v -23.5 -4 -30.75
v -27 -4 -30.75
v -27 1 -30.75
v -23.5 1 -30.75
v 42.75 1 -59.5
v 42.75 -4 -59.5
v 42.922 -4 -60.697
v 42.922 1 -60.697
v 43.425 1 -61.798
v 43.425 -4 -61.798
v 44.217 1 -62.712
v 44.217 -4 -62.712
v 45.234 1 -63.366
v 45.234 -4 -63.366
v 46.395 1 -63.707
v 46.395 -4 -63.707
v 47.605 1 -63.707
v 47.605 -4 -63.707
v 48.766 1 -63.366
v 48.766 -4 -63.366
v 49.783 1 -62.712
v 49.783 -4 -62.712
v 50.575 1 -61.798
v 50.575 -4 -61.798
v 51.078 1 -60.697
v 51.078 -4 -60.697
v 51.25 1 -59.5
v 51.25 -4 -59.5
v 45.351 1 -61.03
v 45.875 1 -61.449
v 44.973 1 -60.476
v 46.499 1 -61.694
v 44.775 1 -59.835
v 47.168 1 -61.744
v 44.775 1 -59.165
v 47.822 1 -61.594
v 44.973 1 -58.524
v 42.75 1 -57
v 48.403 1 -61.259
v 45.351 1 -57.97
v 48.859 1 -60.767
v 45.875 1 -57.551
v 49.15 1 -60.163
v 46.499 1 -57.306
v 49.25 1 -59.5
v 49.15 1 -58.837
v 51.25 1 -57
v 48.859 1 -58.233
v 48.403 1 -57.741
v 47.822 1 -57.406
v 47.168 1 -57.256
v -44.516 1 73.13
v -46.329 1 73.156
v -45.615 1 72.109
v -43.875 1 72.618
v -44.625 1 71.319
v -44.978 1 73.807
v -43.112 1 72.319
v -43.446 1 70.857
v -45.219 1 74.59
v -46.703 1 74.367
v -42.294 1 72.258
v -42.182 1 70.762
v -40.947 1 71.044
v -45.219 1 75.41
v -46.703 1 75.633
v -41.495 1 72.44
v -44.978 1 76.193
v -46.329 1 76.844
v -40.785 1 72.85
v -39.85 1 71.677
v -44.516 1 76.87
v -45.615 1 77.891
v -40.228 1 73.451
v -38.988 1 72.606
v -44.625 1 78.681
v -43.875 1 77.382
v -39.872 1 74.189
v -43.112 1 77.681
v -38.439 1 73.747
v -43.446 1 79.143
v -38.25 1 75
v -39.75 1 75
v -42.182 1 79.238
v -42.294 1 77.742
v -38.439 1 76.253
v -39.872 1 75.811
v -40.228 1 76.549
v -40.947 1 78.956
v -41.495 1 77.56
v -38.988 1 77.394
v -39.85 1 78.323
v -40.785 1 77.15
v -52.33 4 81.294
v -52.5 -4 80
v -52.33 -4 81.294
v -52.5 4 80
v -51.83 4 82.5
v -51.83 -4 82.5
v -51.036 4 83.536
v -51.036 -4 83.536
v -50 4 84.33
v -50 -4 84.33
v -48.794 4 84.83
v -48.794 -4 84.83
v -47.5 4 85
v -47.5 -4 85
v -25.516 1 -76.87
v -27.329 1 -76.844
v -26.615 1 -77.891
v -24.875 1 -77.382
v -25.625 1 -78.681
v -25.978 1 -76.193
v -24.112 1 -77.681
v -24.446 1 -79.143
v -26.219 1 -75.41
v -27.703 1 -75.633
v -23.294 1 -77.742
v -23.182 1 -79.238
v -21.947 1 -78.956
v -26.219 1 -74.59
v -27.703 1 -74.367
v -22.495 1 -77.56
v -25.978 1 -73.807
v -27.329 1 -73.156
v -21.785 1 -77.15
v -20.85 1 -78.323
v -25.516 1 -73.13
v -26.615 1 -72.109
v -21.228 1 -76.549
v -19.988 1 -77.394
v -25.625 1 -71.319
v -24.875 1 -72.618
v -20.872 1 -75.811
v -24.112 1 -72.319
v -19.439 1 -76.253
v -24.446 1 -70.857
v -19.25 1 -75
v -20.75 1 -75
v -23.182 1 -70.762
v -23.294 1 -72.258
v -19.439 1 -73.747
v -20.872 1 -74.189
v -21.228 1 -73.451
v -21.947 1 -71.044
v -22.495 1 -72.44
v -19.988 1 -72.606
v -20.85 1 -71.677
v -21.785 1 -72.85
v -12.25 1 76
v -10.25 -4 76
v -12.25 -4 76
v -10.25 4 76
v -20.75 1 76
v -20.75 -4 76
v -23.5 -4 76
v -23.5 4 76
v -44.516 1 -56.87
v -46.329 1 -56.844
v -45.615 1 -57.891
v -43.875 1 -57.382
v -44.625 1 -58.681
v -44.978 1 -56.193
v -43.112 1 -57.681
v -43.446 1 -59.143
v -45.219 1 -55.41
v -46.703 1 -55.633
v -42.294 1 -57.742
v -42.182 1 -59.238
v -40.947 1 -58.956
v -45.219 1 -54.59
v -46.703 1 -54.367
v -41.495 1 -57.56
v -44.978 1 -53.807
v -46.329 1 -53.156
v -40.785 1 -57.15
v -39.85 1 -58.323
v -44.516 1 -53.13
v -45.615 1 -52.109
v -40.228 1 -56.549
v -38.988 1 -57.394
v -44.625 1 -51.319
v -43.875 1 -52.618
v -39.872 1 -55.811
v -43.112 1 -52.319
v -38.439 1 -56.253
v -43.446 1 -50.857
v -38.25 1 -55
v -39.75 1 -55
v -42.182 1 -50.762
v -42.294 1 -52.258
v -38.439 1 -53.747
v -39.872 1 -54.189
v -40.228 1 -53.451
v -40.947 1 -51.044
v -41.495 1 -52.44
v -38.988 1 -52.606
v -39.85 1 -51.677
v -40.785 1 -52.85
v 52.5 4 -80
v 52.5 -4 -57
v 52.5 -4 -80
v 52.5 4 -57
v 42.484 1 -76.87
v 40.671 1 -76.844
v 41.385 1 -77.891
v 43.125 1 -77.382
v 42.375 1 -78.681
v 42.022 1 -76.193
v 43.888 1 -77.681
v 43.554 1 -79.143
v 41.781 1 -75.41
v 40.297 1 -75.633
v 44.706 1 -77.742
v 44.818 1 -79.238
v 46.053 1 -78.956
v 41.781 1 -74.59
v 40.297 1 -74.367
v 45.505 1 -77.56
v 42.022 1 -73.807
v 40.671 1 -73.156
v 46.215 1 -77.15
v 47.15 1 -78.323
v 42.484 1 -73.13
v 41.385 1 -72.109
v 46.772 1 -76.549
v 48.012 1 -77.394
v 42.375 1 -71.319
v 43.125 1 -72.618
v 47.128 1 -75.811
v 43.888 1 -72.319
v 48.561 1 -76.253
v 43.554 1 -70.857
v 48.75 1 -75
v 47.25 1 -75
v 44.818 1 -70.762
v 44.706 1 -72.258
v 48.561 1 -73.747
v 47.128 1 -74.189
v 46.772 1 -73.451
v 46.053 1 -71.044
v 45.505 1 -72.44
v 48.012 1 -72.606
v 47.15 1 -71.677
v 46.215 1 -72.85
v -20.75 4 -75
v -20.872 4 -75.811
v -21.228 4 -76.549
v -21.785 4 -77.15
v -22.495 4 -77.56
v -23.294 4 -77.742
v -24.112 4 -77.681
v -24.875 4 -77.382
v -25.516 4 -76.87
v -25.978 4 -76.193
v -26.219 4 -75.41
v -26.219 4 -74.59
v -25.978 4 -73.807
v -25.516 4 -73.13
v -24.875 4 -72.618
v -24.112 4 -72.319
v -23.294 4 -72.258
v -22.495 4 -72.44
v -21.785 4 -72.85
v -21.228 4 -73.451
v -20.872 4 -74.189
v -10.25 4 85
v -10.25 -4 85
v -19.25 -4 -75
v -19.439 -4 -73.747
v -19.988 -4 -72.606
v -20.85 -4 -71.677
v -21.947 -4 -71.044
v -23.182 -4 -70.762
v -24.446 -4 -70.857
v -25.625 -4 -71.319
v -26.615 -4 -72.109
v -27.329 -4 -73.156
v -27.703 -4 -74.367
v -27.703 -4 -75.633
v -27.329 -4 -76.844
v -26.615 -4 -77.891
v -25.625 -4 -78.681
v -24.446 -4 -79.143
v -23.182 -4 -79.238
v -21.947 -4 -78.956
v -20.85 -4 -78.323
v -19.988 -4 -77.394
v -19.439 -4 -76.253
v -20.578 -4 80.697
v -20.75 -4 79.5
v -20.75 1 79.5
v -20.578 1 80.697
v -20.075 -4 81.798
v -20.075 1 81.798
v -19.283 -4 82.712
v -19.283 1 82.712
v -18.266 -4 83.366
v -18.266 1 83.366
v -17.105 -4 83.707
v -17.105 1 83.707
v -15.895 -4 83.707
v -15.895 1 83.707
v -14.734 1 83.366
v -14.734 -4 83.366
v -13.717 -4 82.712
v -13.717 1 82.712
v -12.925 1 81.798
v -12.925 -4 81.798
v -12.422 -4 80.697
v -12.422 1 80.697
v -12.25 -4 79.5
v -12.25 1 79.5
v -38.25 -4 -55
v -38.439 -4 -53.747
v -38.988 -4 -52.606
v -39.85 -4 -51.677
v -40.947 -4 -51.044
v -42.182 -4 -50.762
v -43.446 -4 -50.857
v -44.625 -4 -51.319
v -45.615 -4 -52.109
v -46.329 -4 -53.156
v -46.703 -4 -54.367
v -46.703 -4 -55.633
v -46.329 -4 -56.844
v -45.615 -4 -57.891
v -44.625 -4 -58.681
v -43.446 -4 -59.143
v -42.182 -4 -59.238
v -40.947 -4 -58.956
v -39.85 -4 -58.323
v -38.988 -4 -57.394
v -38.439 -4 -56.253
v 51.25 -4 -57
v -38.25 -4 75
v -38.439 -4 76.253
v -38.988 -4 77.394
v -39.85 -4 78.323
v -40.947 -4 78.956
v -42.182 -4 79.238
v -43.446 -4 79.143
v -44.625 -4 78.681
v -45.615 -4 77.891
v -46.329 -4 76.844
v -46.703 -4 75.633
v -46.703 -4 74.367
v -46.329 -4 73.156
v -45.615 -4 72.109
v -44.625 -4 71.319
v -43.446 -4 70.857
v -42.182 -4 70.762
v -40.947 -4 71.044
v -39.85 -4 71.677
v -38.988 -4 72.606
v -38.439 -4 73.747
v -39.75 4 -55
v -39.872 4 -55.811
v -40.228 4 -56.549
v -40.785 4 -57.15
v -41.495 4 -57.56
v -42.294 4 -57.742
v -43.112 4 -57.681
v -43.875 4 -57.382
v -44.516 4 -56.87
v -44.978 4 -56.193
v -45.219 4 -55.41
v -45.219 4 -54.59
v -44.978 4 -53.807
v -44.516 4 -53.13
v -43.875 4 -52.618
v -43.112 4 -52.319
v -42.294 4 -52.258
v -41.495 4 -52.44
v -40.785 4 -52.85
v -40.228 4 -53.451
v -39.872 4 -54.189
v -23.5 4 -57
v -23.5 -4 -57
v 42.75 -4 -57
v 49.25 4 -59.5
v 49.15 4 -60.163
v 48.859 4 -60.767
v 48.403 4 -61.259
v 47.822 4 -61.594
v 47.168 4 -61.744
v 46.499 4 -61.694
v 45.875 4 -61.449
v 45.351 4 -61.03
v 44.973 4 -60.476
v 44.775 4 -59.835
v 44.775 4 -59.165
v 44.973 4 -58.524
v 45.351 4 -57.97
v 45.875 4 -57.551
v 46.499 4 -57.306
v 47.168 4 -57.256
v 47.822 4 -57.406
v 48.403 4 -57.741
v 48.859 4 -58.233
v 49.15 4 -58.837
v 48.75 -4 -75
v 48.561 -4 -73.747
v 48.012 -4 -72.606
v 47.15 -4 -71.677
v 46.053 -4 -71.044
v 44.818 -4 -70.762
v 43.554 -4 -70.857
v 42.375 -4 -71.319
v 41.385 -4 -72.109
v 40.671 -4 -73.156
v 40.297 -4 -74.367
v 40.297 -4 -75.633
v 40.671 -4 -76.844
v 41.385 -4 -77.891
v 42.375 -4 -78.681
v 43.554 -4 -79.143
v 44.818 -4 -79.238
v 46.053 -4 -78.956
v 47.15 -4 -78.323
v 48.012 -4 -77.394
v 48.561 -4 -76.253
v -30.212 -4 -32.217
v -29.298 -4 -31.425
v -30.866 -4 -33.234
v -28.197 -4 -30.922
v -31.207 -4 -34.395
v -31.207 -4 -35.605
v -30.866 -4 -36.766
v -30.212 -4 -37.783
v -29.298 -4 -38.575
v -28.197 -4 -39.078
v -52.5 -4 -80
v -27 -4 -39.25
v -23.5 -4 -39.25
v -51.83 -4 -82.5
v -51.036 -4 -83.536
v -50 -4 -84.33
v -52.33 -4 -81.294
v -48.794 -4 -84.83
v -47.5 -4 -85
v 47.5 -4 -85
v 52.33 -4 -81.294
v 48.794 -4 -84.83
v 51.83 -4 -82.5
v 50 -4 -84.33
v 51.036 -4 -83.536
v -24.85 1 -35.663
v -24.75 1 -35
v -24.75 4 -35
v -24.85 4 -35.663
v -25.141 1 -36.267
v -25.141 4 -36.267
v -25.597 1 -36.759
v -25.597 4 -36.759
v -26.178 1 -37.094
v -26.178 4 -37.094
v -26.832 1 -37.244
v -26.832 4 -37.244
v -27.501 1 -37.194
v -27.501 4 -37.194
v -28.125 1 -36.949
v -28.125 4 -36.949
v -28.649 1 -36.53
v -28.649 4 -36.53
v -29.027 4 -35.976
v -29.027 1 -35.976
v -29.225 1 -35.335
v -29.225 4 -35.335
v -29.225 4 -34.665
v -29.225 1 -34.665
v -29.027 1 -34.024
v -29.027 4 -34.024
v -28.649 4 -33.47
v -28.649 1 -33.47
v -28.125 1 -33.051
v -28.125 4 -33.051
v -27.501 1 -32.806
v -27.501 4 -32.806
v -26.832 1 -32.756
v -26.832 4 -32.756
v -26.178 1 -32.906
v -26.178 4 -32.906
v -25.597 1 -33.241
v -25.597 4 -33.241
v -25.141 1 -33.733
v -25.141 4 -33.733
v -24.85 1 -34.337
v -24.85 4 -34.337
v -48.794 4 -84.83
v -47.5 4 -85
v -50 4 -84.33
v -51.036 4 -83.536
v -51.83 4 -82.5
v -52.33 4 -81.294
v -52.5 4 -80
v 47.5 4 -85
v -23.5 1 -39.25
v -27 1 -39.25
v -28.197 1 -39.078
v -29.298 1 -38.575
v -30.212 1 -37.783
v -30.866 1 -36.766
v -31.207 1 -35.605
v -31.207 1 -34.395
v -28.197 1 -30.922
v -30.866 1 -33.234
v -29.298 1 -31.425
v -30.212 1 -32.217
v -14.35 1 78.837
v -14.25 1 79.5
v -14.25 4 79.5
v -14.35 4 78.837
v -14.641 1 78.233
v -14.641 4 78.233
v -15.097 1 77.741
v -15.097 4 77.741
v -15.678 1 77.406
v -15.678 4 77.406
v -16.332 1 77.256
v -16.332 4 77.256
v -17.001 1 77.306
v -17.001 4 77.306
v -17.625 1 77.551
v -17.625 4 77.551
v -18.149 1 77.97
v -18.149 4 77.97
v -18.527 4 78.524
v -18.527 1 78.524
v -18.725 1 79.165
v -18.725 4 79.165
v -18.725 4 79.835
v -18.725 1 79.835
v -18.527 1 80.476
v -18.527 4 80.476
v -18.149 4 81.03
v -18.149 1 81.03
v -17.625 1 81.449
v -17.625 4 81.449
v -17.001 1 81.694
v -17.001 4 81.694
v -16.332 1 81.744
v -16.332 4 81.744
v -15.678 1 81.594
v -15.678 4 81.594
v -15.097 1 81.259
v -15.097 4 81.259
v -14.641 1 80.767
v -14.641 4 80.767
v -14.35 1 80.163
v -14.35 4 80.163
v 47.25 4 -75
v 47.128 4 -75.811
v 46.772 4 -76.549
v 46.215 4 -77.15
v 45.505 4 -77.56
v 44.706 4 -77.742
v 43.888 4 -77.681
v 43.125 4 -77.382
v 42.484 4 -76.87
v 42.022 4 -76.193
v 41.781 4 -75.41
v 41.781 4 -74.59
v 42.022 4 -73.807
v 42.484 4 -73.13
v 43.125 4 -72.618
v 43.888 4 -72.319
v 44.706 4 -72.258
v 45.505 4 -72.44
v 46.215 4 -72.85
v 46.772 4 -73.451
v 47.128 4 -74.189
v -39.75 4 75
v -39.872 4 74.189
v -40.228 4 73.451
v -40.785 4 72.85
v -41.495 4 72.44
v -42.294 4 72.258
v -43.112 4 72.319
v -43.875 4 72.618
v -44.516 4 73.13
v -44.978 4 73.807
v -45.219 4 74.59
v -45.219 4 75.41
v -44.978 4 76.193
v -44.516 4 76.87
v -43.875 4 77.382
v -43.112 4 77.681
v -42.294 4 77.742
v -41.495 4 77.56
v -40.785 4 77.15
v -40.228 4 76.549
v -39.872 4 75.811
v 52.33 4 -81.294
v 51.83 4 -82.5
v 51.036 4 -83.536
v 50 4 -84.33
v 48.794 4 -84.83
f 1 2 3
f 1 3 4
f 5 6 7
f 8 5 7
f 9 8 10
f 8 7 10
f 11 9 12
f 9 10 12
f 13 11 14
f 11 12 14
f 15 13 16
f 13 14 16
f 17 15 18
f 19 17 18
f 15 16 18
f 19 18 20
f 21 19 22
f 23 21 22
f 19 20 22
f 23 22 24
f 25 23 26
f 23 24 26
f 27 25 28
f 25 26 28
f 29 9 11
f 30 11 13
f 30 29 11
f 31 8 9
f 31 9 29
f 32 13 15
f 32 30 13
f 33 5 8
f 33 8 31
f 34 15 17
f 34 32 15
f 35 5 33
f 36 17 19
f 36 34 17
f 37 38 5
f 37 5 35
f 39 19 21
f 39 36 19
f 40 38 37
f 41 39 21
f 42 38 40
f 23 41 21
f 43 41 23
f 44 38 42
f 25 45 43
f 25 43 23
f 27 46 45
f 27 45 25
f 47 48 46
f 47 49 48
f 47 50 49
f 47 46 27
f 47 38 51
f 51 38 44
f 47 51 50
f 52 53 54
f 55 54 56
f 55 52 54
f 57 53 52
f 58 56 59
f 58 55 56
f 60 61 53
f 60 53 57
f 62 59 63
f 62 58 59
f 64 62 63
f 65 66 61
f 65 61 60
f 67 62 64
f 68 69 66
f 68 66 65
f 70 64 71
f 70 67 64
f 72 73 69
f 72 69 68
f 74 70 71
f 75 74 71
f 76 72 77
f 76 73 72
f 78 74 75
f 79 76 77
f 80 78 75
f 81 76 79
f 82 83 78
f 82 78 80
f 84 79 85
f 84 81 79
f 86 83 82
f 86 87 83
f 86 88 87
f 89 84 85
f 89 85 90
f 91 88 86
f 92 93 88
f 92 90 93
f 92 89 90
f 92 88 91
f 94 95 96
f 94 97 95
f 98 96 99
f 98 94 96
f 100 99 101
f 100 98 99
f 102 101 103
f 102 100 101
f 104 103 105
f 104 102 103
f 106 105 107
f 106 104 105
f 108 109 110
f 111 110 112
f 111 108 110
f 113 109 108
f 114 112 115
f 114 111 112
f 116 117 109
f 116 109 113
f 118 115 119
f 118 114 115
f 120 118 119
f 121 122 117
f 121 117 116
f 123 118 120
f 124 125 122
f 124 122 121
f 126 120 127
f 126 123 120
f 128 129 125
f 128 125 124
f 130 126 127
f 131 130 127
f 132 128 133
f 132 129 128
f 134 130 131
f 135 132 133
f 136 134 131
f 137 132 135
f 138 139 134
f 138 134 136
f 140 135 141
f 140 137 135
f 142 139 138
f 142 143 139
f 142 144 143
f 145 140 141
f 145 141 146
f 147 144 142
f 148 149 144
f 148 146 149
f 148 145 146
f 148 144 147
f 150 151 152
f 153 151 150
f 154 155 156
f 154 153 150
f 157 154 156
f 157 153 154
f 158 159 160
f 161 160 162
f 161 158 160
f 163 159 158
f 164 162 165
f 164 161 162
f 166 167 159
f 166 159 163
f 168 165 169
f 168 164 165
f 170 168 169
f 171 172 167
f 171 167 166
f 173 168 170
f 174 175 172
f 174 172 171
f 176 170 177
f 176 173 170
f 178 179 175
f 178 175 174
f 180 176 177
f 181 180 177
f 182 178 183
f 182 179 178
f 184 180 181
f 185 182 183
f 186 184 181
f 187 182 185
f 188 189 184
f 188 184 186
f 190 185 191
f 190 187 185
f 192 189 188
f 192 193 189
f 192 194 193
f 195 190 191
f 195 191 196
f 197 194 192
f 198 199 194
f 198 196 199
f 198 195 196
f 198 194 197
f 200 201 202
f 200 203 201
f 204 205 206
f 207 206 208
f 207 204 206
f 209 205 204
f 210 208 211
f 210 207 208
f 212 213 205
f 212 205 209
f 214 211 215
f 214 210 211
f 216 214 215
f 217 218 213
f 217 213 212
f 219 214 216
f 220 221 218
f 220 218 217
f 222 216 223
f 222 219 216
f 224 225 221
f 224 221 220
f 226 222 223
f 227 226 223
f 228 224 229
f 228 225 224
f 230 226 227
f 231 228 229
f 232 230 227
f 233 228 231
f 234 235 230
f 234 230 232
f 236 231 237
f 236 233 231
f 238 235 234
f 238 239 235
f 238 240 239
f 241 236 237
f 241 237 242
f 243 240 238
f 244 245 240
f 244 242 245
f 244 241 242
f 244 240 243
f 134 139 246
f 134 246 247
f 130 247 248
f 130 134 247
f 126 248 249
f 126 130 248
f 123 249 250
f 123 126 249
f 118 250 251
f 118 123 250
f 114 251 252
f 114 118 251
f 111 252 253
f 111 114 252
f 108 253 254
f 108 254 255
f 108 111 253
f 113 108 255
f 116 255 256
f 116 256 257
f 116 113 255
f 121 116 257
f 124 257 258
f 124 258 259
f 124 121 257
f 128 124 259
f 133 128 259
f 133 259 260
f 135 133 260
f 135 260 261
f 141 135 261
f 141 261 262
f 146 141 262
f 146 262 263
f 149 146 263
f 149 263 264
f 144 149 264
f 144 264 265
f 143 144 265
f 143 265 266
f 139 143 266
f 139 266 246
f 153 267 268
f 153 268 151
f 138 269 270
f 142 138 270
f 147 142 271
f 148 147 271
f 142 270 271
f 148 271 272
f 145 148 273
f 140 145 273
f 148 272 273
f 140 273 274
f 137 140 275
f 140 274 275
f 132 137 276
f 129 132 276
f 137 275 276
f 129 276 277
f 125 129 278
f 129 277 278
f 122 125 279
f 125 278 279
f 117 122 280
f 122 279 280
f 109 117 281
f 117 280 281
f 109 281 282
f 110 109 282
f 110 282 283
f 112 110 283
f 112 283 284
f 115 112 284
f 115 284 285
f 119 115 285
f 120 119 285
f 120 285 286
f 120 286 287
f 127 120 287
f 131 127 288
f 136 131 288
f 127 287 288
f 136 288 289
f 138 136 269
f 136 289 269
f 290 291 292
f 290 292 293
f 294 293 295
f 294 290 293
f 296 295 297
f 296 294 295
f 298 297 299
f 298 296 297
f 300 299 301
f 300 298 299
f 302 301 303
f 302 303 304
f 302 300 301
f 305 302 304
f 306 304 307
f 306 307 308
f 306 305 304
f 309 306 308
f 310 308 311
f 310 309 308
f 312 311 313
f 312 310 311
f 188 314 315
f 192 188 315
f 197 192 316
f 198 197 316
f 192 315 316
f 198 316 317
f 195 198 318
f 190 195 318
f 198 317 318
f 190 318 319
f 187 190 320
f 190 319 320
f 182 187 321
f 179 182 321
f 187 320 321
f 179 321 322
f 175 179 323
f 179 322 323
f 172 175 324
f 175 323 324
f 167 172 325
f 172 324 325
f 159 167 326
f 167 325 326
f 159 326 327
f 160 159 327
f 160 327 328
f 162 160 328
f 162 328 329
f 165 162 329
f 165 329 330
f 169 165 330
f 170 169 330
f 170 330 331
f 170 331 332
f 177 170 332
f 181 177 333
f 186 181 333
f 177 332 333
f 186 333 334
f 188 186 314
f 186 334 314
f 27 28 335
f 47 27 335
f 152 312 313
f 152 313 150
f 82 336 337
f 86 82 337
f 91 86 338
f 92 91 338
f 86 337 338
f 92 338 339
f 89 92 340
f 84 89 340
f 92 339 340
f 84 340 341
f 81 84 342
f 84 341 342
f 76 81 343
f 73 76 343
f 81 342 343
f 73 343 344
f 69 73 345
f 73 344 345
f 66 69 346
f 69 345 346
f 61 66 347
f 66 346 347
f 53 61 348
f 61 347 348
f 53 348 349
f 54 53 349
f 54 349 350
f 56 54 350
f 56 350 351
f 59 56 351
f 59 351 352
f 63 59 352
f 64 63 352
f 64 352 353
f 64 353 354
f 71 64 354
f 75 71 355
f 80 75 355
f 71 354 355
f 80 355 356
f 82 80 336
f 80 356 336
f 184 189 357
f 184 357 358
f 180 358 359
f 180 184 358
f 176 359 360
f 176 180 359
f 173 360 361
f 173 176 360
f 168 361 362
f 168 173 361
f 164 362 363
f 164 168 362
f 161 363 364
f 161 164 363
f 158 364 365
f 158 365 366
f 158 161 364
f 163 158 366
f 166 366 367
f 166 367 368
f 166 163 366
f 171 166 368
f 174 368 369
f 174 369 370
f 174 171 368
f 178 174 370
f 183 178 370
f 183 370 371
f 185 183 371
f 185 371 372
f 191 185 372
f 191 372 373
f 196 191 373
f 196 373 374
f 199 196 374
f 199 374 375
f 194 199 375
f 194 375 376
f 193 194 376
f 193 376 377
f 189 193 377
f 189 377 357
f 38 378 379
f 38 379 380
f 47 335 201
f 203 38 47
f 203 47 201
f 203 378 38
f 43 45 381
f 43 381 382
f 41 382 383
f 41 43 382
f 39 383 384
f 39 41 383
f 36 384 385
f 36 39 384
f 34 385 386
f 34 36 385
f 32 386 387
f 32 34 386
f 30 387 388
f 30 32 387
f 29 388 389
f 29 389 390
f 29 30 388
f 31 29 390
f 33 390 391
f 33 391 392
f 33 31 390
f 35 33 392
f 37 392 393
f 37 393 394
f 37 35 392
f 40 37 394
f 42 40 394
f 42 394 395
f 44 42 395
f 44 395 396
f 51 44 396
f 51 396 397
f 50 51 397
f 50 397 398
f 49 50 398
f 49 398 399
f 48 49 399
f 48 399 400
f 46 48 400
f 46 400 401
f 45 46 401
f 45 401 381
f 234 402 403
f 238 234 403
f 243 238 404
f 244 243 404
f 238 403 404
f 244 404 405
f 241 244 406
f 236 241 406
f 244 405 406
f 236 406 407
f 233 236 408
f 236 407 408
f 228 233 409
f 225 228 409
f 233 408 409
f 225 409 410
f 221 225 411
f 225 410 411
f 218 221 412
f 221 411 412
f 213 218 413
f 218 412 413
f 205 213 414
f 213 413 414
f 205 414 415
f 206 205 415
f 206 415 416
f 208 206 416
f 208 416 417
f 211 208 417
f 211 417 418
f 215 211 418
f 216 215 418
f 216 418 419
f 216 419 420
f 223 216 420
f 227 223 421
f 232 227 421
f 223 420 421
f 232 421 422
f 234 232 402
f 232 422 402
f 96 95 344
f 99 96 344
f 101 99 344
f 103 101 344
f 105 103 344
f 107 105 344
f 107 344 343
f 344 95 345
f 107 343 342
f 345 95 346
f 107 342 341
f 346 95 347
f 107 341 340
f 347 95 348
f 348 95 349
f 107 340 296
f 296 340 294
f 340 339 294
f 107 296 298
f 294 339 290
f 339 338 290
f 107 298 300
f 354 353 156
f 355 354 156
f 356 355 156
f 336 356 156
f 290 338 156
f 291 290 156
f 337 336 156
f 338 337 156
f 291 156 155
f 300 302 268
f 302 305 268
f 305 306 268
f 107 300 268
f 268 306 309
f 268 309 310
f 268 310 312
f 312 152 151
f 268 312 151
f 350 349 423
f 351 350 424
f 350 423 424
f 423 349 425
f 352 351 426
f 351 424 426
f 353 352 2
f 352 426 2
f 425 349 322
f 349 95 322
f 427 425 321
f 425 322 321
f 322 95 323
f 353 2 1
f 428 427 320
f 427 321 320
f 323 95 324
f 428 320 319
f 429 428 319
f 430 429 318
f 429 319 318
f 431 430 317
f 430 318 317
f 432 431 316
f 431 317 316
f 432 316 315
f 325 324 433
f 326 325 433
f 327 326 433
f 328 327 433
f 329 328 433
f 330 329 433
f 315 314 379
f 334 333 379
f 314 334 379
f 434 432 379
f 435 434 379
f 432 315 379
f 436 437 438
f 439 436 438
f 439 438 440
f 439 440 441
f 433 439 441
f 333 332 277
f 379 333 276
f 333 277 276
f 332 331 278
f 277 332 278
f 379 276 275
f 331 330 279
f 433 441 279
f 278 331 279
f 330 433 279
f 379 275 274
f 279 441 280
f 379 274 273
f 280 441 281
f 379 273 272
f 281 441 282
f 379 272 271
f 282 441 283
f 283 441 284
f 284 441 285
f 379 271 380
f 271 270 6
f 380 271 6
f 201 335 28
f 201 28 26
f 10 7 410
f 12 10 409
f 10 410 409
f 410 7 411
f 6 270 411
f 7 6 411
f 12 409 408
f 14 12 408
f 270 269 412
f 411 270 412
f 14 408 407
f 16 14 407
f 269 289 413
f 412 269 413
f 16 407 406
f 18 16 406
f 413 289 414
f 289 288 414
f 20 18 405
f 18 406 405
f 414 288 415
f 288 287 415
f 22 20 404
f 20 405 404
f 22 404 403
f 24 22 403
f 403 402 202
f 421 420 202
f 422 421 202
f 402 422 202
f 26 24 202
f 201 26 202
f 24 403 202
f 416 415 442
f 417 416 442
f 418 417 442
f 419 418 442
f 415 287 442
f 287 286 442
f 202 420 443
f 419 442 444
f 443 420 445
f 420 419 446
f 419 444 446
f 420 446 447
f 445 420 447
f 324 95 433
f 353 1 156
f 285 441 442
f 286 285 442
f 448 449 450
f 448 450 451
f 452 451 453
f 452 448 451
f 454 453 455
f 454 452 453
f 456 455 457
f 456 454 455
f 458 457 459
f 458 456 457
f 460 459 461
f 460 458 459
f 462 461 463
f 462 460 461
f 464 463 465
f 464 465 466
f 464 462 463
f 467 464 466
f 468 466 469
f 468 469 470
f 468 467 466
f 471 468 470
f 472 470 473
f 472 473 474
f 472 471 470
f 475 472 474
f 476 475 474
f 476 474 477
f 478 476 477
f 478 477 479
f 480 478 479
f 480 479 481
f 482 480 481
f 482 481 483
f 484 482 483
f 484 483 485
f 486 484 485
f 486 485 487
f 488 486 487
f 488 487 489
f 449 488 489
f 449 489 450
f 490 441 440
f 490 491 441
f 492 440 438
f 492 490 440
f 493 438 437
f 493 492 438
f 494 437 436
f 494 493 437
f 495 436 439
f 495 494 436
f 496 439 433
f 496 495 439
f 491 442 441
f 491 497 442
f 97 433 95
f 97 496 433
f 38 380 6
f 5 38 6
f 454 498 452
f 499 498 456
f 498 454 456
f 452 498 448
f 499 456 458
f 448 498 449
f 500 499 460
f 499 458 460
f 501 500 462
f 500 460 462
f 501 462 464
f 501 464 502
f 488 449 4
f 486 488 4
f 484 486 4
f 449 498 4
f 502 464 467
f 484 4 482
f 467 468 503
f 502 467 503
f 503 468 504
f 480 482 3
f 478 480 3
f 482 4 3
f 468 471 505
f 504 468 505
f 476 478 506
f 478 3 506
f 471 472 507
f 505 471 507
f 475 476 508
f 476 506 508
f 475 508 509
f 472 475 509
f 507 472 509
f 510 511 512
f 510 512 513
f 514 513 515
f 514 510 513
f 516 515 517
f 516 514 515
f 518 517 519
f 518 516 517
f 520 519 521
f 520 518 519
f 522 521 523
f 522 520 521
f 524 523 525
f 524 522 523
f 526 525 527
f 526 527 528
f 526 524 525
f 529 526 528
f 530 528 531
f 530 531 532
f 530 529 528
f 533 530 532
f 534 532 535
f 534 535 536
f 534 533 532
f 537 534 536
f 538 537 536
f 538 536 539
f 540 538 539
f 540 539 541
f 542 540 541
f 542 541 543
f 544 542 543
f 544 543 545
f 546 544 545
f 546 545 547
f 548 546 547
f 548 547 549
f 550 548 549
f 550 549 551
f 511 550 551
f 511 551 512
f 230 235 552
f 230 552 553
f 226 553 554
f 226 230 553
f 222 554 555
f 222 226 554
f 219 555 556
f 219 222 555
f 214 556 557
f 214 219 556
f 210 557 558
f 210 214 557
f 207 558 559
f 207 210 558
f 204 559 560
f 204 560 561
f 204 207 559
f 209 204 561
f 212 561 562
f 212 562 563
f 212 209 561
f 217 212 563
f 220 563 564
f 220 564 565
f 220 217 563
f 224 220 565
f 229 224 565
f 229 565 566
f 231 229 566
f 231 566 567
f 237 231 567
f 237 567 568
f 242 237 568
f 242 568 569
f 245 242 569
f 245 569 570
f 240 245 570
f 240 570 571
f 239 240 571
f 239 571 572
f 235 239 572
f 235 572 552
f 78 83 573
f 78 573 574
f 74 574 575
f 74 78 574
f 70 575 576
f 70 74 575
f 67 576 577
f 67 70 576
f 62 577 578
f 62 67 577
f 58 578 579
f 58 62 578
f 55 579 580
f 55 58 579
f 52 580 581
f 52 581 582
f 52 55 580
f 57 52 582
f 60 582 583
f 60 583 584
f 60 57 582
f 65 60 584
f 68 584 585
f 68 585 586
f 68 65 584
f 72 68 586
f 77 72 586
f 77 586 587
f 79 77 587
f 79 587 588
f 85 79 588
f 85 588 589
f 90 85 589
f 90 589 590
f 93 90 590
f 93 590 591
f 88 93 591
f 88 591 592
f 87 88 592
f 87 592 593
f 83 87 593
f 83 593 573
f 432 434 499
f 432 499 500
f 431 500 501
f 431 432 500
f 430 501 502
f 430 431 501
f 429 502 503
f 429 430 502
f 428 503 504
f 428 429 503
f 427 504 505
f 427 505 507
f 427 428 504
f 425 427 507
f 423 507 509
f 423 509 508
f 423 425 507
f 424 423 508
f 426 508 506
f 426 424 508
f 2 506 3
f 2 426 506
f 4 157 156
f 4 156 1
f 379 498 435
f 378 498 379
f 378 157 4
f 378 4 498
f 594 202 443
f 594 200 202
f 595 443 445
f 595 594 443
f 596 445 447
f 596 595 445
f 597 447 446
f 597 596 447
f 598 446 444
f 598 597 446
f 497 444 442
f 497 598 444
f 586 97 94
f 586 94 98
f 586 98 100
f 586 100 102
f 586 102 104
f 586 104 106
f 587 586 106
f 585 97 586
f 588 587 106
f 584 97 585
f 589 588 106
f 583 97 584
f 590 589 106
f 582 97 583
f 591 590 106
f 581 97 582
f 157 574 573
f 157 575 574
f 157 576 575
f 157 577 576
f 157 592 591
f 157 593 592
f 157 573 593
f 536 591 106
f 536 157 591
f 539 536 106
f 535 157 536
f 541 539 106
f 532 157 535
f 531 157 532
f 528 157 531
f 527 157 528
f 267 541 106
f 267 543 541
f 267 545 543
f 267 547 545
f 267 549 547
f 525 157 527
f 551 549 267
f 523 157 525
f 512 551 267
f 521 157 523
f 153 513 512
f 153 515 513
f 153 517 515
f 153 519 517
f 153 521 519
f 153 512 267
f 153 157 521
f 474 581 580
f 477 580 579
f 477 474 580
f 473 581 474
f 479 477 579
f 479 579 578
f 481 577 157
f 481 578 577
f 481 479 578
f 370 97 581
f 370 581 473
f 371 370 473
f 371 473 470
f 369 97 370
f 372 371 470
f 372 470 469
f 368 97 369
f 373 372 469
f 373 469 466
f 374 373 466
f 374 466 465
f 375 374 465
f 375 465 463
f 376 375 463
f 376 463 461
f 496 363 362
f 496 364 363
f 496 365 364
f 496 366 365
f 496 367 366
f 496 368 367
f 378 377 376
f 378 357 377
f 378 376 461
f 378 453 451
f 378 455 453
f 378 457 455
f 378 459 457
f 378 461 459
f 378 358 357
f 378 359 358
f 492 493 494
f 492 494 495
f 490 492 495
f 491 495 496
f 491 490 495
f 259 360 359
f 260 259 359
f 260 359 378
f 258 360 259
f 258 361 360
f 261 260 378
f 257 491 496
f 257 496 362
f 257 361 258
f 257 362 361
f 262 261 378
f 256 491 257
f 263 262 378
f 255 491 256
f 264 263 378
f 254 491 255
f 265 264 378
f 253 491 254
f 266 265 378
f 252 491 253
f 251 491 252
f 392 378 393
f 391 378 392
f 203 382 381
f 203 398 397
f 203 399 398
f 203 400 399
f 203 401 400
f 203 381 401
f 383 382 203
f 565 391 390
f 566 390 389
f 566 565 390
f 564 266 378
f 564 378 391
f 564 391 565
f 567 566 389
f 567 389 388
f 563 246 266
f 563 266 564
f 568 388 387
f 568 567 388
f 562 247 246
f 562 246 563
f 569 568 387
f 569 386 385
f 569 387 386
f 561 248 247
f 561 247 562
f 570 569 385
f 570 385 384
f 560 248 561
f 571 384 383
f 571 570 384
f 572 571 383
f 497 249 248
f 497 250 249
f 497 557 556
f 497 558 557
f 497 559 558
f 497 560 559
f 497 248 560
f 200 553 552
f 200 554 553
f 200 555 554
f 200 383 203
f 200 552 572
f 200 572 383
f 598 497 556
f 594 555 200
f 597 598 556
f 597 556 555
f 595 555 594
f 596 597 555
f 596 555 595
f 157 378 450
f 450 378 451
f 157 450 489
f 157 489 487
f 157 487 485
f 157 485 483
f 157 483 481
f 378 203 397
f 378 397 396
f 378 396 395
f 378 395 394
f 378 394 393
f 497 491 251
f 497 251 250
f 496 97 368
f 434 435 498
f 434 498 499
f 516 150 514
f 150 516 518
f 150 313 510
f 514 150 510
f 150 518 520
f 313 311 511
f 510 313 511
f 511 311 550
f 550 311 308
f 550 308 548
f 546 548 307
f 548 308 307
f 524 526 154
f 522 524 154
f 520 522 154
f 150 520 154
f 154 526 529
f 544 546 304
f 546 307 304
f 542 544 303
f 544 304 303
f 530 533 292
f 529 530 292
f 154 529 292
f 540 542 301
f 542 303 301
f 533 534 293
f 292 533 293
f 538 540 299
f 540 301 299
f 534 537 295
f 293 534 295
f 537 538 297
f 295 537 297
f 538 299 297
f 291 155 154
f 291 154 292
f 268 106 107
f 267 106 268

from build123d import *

# Parameters (mm, degrees)
BOSS_EXTRUDE1_DEPTH      = 4
BOSS_EXTRUDE1_DEPTH_BACK = 4
SKETCH2_R                = 2.75
SKETCH2_R_2              = 2.25
SKETCH3_R                = 4.25
CUT_EXTRUDE1_DEPTH       = 5


with BuildPart() as part:
    # Sketch2 → Boss-Extrude1 (new, two sides: drawn at the far end of the back side and taken through both)
    with BuildSketch(Plane(origin=(0, 0, 0), x_dir=(1, 0, 0), z_dir=(0, 1, 0)).offset(-BOSS_EXTRUDE1_DEPTH_BACK)):
        with BuildLine():
            ThreePointArc((-52.5, -80), (-51.035533906, -83.535533906), (-47.5, -85))
            Line((-47.5, -85), (-23.5, -85))
            Line((-23.5, -85), (-10.25, -85))
            Line((-10.25, -85), (-10.25, -76))
            Line((-10.25, -76), (-23.5, -76))
            Line((-23.5, -76), (-23.5, -62.428663753))
            Line((-23.5, -62.428663753), (-23.5, 57))
            Line((-23.5, 57), (52.5, 57))
            Line((52.5, 57), (52.5, 80))
            ThreePointArc((52.5, 80), (51.035533906, 83.535533906), (47.5, 85))
            Line((47.5, 85), (-47.5, 85))
            ThreePointArc((-47.5, 85), (-51.035533906, 83.535533906), (-52.5, 80))
            Line((-52.5, 80), (-52.5, -80))
        make_face()
        with Locations((-42.5, -75)):
            Circle(SKETCH2_R, mode=Mode.SUBTRACT)
        with Locations((-16.5, -79.5)):
            Circle(SKETCH2_R_2, mode=Mode.SUBTRACT)
        with Locations((-27, 35)):
            Circle(SKETCH2_R_2, mode=Mode.SUBTRACT)
        with Locations((-42.5, 55)):
            Circle(SKETCH2_R, mode=Mode.SUBTRACT)
        with Locations((-23.5, 75)):
            Circle(SKETCH2_R, mode=Mode.SUBTRACT)
        with Locations((47, 59.5)):
            Circle(SKETCH2_R_2, mode=Mode.SUBTRACT)
        with Locations((44.5, 75)):
            Circle(SKETCH2_R, mode=Mode.SUBTRACT)
    extrude(amount=BOSS_EXTRUDE1_DEPTH + BOSS_EXTRUDE1_DEPTH_BACK)

    # Sketch3 → Cut-Extrude1 (cut)
    with BuildSketch(Plane.XZ.offset(4)):
        with Locations((-23.5, -75)):
            Circle(SKETCH3_R)
        with Locations((-42.5, -55)):
            Circle(SKETCH3_R)
        with Locations((-42.5, 75)):
            Circle(SKETCH3_R)
        with Locations((44.5, -75)):
            Circle(SKETCH3_R)
        with BuildLine():
            Line((-27, -30.75), (-23.5, -30.75))
            Line((-23.5, -30.75), (-23.5, -39.25))
            Line((-23.5, -39.25), (-27, -39.25))
            ThreePointArc((-27, -39.25), (-31.25, -35), (-27, -30.75))
        make_face()
        with BuildLine():
            Line((51.25, -59.5), (51.25, -57))
            Line((51.25, -57), (42.75, -57))
            Line((42.75, -57), (42.75, -59.5))
            ThreePointArc((42.75, -59.5), (47, -63.75), (51.25, -59.5))
        make_face()
        with BuildLine():
            Line((-12.25, 79.5), (-12.25, 76))
            Line((-12.25, 76), (-20.75, 76))
            Line((-20.75, 76), (-20.75, 79.5))
            ThreePointArc((-20.75, 79.5), (-16.5, 83.75), (-12.25, 79.5))
        make_face()
    extrude(amount=-CUT_EXTRUDE1_DEPTH, mode=Mode.SUBTRACT)


solid = part.part
